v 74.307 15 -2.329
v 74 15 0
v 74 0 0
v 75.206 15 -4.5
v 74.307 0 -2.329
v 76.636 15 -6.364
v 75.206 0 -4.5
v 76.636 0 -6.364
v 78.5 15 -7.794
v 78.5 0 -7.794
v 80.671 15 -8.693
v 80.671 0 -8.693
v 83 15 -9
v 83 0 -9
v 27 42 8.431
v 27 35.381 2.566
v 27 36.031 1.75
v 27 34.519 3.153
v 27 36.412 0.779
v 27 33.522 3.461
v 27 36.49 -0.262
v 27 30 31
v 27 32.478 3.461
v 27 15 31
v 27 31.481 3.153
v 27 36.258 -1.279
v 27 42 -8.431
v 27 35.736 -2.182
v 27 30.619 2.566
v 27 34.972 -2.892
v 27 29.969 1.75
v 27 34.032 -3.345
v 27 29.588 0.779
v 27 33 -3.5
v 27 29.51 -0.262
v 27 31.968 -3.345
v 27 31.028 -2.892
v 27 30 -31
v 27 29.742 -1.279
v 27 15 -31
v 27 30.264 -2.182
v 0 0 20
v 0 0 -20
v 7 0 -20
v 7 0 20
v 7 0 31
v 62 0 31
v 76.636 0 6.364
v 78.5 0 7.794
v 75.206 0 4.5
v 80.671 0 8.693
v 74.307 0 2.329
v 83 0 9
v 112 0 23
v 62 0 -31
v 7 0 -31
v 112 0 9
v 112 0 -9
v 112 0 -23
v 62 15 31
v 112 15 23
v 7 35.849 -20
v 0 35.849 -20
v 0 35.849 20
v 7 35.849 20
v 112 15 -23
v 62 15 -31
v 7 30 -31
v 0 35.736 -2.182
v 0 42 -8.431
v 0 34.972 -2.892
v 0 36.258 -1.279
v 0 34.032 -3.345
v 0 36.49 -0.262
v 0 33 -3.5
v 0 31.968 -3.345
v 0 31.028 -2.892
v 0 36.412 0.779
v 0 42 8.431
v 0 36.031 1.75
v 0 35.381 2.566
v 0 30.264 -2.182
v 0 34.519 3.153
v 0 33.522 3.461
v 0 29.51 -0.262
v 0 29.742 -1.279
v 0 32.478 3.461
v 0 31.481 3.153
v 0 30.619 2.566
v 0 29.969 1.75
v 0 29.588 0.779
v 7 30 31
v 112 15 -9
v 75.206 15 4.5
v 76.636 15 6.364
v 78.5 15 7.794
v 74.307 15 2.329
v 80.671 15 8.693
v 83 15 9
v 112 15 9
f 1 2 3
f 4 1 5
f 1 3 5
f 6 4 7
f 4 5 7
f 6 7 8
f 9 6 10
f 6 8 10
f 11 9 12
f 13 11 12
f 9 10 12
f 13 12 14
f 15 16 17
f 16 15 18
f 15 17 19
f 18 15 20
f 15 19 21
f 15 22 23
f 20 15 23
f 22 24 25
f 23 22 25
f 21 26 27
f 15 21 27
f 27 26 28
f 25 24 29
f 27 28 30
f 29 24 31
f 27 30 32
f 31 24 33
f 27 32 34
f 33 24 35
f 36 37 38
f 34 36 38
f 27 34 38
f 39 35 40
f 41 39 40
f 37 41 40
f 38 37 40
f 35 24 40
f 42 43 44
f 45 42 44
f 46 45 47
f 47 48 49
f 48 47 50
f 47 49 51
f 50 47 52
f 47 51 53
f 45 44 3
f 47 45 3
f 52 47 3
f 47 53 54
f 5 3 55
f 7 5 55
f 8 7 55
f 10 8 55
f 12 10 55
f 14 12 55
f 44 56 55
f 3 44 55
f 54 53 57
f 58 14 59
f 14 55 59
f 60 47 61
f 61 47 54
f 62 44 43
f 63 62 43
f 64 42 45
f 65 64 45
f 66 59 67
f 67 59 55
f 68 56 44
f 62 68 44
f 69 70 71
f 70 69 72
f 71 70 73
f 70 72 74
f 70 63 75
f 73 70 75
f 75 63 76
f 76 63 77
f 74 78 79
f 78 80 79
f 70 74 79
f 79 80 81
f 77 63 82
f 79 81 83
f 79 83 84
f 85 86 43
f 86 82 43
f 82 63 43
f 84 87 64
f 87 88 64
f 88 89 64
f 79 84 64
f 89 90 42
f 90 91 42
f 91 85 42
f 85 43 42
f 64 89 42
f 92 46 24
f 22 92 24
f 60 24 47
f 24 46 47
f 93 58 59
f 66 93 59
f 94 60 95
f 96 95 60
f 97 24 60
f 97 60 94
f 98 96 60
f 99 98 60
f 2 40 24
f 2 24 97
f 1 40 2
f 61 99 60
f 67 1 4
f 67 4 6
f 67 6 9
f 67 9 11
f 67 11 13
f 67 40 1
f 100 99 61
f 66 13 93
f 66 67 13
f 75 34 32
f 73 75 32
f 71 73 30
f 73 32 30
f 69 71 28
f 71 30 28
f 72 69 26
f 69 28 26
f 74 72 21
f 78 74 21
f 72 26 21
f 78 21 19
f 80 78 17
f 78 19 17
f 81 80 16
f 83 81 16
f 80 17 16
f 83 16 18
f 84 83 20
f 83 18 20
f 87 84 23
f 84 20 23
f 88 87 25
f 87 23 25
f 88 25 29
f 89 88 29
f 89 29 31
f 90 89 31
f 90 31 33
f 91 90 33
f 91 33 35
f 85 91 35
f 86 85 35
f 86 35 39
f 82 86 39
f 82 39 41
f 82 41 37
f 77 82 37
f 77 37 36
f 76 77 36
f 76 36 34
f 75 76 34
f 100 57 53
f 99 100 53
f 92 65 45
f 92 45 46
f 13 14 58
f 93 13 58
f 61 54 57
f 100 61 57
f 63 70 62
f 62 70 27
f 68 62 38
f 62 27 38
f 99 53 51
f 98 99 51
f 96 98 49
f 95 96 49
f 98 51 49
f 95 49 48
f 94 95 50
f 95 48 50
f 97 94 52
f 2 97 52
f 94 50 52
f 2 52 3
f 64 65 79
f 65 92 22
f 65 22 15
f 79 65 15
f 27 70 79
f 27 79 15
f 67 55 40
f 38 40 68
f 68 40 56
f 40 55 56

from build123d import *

# Parameters (mm, degrees)
BOSS_EXTRUDE1_DEPTH = 15
BOSS_EXTRUDE2_DEPTH = 42
CUT_EXTRUDE1_REACH  = 101.75
SKETCH2_R           = 3.5


with BuildPart() as part:
    # Sketch1 → Boss-Extrude1 (new body)
    with BuildSketch(Plane(origin=(0, 0, 0), x_dir=(1, 0, 0), z_dir=(0, 1, 0))):
        with BuildLine():
            ThreePointArc((83, -9), (74, 0), (83, 9))
            Line((83, 9), (112, 9))
            Line((112, 9), (112, 23))
            Line((112, 23), (62, 31))
            Line((62, 31), (27, 31))
            Line((27, 31), (27, -31))
            Line((27, -31), (62, -31))
            Line((62, -31), (112, -23))
            Line((112, -23), (112, -9))
            Line((112, -9), (83, -9))
        make_face()
    extrude(amount=BOSS_EXTRUDE1_DEPTH)

    # Sketch1<3> → Boss-Extrude2 (add)
    with BuildSketch(Plane(origin=(0, 0, 0), x_dir=(1, 0, 0), z_dir=(0, 1, 0))):
        Polygon((7, 20), (0, 20), (0, -20), (7, -20), (7, -31), (27, -31), (27, 31), (7, 31), align=None)
    extrude(amount=BOSS_EXTRUDE2_DEPTH)

    # Sketch2 → Cut-Extrude1 (cut, up to next)
    with BuildSketch(Plane(origin=(27, 0, 0), x_dir=(0, 0, -1), z_dir=(1, 0, 0)), mode=Mode.PRIVATE) as cut_extrude1_sk1:
        Polygon((31, 42), (8.431282416, 42), (31, 30), align=None)
    cut_extrude1_tool1 = extrude(cut_extrude1_sk1.sketch, amount=-CUT_EXTRUDE1_REACH, mode=Mode.PRIVATE) & part.part
    # Sketch2 → Cut-Extrude1 (cut, up to next)
    with BuildSketch(Plane(origin=(27, 0, 0), x_dir=(0, 0, -1), z_dir=(1, 0, 0)), mode=Mode.PRIVATE) as cut_extrude1_sk2:
        Polygon((-31, 30), (-8.431282416, 42), (-31, 42), align=None)
    cut_extrude1_tool2 = extrude(cut_extrude1_sk2.sketch, amount=-CUT_EXTRUDE1_REACH, mode=Mode.PRIVATE) & part.part
    # Sketch2 → Cut-Extrude1 (cut, up to next)
    with BuildSketch(Plane(origin=(27, 0, 0), x_dir=(0, 0, -1), z_dir=(1, 0, 0)), mode=Mode.PRIVATE) as cut_extrude1_sk3:
        with Locations((0, 33)):
            Circle(SKETCH2_R)
    cut_extrude1_tool3 = extrude(cut_extrude1_sk3.sketch, amount=-CUT_EXTRUDE1_REACH, mode=Mode.PRIVATE) & part.part
    add(cut_extrude1_tool1.solids().sort_by_distance((27, 38, -23.477094))[0], mode=Mode.SUBTRACT)
    add(cut_extrude1_tool2.solids().sort_by_distance((27, 38, 23.477094))[0], mode=Mode.SUBTRACT)
    add(cut_extrude1_tool3.solids().sort_by_distance((27, 33, 0))[0], mode=Mode.SUBTRACT)


solid = part.part
